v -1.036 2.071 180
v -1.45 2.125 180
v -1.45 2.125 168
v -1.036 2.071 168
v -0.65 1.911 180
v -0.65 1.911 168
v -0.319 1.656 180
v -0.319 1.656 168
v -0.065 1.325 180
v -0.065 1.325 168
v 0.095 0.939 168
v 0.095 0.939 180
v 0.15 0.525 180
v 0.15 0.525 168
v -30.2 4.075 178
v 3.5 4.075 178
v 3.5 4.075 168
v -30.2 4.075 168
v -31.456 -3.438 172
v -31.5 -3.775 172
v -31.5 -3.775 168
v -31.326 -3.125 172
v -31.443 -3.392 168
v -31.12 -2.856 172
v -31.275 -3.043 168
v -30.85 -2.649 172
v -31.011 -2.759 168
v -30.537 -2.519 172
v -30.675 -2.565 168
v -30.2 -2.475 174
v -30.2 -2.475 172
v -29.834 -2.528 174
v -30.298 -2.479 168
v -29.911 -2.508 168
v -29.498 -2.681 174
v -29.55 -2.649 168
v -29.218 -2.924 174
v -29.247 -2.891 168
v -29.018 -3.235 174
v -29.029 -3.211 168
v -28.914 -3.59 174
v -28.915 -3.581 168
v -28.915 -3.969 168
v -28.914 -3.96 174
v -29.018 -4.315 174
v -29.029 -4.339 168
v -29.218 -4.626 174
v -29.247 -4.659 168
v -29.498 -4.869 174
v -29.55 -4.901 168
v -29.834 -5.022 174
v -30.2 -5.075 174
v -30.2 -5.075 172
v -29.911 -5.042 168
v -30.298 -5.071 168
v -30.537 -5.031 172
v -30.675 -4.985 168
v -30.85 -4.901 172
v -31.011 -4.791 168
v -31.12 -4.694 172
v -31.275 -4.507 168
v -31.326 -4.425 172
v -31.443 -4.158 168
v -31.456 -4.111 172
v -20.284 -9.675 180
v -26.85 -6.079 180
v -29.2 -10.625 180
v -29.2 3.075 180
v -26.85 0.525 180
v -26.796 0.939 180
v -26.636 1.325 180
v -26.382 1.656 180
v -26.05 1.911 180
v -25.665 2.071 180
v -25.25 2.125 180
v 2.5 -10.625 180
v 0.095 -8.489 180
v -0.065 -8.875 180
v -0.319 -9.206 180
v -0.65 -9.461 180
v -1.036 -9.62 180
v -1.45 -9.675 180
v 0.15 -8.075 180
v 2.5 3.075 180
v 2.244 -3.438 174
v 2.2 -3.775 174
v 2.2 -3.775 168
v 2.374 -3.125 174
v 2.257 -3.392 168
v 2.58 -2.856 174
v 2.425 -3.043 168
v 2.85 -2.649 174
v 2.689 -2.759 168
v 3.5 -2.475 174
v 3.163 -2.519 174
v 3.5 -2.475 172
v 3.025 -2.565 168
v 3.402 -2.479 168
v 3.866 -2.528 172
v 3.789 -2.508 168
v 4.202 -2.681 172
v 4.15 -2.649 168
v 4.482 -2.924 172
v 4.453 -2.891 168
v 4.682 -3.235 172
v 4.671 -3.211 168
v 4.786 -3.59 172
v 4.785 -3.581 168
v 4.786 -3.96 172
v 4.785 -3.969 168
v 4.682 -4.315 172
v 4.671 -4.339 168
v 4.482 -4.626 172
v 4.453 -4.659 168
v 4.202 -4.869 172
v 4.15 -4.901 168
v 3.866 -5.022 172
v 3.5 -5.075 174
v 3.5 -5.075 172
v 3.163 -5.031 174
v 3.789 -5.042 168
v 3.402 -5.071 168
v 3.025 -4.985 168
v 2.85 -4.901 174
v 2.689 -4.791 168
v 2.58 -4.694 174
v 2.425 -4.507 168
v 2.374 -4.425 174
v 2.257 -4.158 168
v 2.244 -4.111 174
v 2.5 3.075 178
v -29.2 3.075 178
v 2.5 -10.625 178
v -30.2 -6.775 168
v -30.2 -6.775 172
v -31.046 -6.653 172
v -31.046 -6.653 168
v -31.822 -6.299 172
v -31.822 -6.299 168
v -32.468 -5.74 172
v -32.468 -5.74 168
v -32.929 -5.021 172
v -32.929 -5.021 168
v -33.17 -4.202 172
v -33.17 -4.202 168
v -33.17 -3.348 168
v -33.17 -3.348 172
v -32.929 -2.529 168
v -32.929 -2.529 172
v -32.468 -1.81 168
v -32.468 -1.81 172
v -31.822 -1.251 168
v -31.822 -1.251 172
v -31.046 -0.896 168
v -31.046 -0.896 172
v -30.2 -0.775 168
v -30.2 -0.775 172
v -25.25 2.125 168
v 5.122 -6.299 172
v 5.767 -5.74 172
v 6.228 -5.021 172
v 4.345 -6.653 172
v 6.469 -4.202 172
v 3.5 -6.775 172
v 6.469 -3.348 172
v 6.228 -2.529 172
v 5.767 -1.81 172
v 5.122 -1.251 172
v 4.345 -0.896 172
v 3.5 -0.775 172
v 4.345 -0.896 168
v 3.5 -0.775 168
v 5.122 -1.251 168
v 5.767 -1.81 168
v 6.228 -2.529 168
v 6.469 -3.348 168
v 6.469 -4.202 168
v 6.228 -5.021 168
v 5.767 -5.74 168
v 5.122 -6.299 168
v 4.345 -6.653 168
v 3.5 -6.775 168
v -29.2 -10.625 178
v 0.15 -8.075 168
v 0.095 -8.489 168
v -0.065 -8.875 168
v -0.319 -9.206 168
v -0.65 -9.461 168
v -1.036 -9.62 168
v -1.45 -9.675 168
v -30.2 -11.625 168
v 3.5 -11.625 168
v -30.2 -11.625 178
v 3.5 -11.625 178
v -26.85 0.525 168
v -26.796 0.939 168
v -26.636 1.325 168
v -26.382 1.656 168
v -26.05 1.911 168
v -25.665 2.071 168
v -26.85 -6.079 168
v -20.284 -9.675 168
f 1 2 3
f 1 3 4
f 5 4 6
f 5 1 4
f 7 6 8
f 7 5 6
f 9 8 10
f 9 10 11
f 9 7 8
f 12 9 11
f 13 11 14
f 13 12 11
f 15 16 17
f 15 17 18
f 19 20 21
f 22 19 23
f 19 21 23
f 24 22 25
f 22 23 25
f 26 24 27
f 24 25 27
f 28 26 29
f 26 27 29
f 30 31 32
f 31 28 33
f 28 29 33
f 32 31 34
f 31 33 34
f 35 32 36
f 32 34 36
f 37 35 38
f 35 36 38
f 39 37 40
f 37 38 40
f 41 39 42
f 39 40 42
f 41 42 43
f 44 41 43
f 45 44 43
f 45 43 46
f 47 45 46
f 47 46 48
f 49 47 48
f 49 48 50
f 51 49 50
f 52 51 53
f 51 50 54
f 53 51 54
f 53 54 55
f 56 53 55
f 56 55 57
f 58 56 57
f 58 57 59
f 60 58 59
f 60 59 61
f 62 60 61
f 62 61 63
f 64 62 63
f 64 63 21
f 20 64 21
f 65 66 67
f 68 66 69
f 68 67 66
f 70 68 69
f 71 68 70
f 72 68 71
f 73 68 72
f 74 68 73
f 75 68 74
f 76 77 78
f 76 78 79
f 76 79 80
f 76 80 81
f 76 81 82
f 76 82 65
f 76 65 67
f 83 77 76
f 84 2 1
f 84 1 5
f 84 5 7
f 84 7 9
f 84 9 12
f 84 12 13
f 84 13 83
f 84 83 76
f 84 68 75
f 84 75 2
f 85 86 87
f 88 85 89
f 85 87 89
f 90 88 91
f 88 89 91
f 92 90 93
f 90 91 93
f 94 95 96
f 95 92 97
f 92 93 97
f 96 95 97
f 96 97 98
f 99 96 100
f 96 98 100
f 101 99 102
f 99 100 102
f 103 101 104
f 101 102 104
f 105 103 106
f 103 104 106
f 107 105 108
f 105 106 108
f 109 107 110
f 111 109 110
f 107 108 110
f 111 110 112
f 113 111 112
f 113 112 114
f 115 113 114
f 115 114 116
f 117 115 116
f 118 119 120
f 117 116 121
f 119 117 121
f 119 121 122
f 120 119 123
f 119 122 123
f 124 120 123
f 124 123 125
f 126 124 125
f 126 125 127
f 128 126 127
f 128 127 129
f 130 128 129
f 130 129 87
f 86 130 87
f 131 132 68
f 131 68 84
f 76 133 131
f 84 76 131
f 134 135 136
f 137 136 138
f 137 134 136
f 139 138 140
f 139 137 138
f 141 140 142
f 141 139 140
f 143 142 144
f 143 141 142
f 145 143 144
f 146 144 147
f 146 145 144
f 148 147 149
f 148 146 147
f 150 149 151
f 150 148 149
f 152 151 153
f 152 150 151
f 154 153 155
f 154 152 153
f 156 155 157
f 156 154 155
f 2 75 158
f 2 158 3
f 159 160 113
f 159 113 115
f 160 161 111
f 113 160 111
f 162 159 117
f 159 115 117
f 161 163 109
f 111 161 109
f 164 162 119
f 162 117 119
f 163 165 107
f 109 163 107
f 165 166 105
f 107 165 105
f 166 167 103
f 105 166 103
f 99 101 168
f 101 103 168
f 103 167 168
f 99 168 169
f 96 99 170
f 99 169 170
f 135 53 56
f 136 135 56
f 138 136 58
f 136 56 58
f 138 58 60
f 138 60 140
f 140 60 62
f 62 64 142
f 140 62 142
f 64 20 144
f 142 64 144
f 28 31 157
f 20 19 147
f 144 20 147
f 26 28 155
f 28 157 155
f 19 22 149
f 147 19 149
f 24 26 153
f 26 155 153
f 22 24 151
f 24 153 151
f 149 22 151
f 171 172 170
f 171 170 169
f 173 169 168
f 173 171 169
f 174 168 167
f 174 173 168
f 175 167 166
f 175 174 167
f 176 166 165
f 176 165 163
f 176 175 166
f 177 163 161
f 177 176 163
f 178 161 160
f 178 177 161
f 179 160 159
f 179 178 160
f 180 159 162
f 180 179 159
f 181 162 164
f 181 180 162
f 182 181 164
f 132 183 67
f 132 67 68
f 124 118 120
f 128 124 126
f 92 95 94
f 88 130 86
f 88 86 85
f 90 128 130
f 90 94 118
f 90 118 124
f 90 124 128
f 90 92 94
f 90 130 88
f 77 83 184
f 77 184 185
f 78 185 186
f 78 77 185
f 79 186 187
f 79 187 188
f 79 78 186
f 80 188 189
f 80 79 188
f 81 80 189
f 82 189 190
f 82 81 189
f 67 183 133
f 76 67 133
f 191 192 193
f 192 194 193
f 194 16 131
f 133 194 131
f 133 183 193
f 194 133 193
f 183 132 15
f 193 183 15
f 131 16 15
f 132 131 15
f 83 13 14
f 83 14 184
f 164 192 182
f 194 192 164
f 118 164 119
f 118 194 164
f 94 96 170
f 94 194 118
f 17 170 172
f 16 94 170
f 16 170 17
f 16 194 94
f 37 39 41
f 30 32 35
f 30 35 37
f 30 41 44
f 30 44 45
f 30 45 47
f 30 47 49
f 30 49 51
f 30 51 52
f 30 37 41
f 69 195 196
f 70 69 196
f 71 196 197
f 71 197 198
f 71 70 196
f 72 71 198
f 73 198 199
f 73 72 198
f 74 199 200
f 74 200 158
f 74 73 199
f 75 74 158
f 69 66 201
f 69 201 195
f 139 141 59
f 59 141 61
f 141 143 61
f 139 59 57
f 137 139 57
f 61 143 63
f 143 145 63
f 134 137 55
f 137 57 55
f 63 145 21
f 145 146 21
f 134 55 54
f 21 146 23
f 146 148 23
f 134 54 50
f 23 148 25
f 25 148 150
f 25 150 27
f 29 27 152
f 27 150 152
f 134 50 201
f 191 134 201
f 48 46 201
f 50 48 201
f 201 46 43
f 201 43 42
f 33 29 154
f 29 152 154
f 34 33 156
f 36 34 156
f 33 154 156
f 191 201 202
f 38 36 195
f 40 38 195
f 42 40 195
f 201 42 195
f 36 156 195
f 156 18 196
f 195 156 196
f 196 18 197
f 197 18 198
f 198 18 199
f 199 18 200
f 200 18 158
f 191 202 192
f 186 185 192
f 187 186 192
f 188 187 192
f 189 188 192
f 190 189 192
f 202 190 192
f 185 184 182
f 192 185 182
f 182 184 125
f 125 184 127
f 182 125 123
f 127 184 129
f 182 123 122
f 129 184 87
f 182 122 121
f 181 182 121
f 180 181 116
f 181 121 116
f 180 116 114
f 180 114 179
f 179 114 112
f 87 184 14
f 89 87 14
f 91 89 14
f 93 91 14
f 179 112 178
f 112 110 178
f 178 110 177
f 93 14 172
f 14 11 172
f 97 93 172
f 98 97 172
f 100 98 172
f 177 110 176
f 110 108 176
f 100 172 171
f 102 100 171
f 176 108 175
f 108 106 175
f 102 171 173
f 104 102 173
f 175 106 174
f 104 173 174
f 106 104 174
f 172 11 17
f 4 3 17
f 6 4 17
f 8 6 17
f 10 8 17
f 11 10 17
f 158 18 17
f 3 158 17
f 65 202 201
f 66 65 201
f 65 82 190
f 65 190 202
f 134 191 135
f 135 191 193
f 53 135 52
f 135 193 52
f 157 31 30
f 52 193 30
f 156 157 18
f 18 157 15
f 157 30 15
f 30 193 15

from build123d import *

# Parameters (mm, degrees)
CROQUIS1_W              = 33.7
CROQUIS1_H              = 15.7
SALIENTE_EXTRUIR1_DEPTH = 5
CROQUIS2_W              = 31.7
CROQUIS2_H              = 13.7
SALIENTE_EXTRUIR2_DEPTH = 2
CORTAR_EXTRUIR1_DEPTH   = 10
CROQUIS4_W              = 33.7
CROQUIS4_H              = 15.7
SALIENTE_EXTRUIR3_DEPTH = 5
CROQUIS6_R              = 3
SALIENTE_EXTRUIR5_DEPTH = 4
SALIENTE_EXTRUIR6_DEPTH = 12
CROQUIS8_R              = 1.3
CORTAR_EXTRUIR2_DEPTH   = 6


with BuildPart() as part:
    # Croquis1 → Saliente-Extruir1 (new body)
    with BuildSketch(Plane(origin=(0, 0, 178), x_dir=(-1, 0, 0), z_dir=(0, 0, -1))):
        with Locations((13.350397628, -3.774933729)):
            Rectangle(CROQUIS1_W, CROQUIS1_H)
    extrude(amount=SALIENTE_EXTRUIR1_DEPTH)

    # Croquis2 → Saliente-Extruir2 (add)
    with BuildSketch(Plane.XY.offset(178)):
        with Locations((-13.350397628, -3.774933729)):
            Rectangle(CROQUIS2_W, CROQUIS2_H)
    extrude(amount=SALIENTE_EXTRUIR2_DEPTH)

    # Croquis3 → Cortar-Extruir1 (cut)
    with BuildSketch(Plane.XY.offset(180)):
        with BuildLine():
            Line((-25.250397628, 2.125066271), (-1.450397628, 2.125066271))
            ThreePointArc((-1.450397628, 2.125066271), (-0.319026778, 1.656437121), (0.149602372, 0.525066271))
            Line((0.149602372, 0.525066271), (0.149602372, -8.074933729))
            ThreePointArc((0.149602372, -8.074933729), (-0.319026778, -9.206304579), (-1.450397628, -9.674933729))
            Line((-1.450397628, -9.674933729), (-25.250397628, -9.674933729))
            ThreePointArc((-25.250397628, -9.674933729), (-26.381768478, -9.206304579), (-26.850397628, -8.074933729))
            Line((-26.850397628, -8.074933729), (-26.850397628, 0.525066271))
            ThreePointArc((-26.850397628, 0.525066271), (-26.381768478, 1.656437121), (-25.250397628, 2.125066271))
        make_face()
    extrude(amount=-CORTAR_EXTRUIR1_DEPTH, mode=Mode.SUBTRACT)

    # Croquis4 → Saliente-Extruir3 (add)
    with BuildSketch(Plane(origin=(0, 0, 173), x_dir=(-1, 0, 0), z_dir=(0, 0, -1))):
        with Locations((13.350397628, -3.774933729)):
            Rectangle(CROQUIS4_W, CROQUIS4_H)
        with BuildLine():
            Line((1.450397628, -9.674933729), (25.250397628, -9.674933729))
            ThreePointArc((25.250397628, -9.674933729), (26.381768478, -9.206304579), (26.850397628, -8.074933729))
            Line((26.850397628, -8.074933729), (26.850397628, 0.525066271))
            ThreePointArc((26.850397628, 0.525066271), (26.381768478, 1.656437121), (25.250397628, 2.125066271))
            Line((25.250397628, 2.125066271), (1.450397628, 2.125066271))
            ThreePointArc((1.450397628, 2.125066271), (0.319026778, 1.656437121), (-0.149602372, 0.525066271))
            Line((-0.149602372, 0.525066271), (-0.149602372, -8.074933729))
            ThreePointArc((-0.149602372, -8.074933729), (0.319026778, -9.206304579), (1.450397628, -9.674933729))
        make_face(mode=Mode.SUBTRACT)
    extrude(amount=SALIENTE_EXTRUIR3_DEPTH)

    # Croquis6 → Saliente-Extruir5 (add)
    with BuildSketch(Plane(origin=(0, 0, 168), x_dir=(-1, 0, 0), z_dir=(0, 0, -1))):
        with Locations((-3.499602372, -3.774933729)):
            Circle(CROQUIS6_R)
        with Locations((30.200397628, -3.774933729)):
            Circle(CROQUIS6_R)
    extrude(amount=-SALIENTE_EXTRUIR5_DEPTH)

    # Croquis7 → Saliente-Extruir6 (add)
    with BuildSketch(Plane(origin=(0, 0, 168), x_dir=(-1, 0, 0), z_dir=(0, 0, -1))):
        with BuildLine():
            Line((20.284128272, -9.674933729), (26.850397628, -6.079245942))
            Line((26.850397628, -6.079245942), (26.850397628, -8.074933729))
            ThreePointArc((26.850397628, -8.074933729), (26.381768478, -9.206304579), (25.250397628, -9.674933729))
            Line((25.250397628, -9.674933729), (20.284128272, -9.674933729))
        make_face()
    extrude(amount=-SALIENTE_EXTRUIR6_DEPTH)

    # Croquis8 → Cortar-Extruir2 (cut)
    with BuildSketch(Plane(origin=(0, 0, 168), x_dir=(-1, 0, 0), z_dir=(0, 0, -1))):
        with Locations((-3.499602372, -3.774933729)):
            Circle(CROQUIS8_R)
        with Locations((30.200397628, -3.774933729)):
            Circle(CROQUIS8_R)
    extrude(amount=-CORTAR_EXTRUIR2_DEPTH, mode=Mode.SUBTRACT)


solid = part.part
